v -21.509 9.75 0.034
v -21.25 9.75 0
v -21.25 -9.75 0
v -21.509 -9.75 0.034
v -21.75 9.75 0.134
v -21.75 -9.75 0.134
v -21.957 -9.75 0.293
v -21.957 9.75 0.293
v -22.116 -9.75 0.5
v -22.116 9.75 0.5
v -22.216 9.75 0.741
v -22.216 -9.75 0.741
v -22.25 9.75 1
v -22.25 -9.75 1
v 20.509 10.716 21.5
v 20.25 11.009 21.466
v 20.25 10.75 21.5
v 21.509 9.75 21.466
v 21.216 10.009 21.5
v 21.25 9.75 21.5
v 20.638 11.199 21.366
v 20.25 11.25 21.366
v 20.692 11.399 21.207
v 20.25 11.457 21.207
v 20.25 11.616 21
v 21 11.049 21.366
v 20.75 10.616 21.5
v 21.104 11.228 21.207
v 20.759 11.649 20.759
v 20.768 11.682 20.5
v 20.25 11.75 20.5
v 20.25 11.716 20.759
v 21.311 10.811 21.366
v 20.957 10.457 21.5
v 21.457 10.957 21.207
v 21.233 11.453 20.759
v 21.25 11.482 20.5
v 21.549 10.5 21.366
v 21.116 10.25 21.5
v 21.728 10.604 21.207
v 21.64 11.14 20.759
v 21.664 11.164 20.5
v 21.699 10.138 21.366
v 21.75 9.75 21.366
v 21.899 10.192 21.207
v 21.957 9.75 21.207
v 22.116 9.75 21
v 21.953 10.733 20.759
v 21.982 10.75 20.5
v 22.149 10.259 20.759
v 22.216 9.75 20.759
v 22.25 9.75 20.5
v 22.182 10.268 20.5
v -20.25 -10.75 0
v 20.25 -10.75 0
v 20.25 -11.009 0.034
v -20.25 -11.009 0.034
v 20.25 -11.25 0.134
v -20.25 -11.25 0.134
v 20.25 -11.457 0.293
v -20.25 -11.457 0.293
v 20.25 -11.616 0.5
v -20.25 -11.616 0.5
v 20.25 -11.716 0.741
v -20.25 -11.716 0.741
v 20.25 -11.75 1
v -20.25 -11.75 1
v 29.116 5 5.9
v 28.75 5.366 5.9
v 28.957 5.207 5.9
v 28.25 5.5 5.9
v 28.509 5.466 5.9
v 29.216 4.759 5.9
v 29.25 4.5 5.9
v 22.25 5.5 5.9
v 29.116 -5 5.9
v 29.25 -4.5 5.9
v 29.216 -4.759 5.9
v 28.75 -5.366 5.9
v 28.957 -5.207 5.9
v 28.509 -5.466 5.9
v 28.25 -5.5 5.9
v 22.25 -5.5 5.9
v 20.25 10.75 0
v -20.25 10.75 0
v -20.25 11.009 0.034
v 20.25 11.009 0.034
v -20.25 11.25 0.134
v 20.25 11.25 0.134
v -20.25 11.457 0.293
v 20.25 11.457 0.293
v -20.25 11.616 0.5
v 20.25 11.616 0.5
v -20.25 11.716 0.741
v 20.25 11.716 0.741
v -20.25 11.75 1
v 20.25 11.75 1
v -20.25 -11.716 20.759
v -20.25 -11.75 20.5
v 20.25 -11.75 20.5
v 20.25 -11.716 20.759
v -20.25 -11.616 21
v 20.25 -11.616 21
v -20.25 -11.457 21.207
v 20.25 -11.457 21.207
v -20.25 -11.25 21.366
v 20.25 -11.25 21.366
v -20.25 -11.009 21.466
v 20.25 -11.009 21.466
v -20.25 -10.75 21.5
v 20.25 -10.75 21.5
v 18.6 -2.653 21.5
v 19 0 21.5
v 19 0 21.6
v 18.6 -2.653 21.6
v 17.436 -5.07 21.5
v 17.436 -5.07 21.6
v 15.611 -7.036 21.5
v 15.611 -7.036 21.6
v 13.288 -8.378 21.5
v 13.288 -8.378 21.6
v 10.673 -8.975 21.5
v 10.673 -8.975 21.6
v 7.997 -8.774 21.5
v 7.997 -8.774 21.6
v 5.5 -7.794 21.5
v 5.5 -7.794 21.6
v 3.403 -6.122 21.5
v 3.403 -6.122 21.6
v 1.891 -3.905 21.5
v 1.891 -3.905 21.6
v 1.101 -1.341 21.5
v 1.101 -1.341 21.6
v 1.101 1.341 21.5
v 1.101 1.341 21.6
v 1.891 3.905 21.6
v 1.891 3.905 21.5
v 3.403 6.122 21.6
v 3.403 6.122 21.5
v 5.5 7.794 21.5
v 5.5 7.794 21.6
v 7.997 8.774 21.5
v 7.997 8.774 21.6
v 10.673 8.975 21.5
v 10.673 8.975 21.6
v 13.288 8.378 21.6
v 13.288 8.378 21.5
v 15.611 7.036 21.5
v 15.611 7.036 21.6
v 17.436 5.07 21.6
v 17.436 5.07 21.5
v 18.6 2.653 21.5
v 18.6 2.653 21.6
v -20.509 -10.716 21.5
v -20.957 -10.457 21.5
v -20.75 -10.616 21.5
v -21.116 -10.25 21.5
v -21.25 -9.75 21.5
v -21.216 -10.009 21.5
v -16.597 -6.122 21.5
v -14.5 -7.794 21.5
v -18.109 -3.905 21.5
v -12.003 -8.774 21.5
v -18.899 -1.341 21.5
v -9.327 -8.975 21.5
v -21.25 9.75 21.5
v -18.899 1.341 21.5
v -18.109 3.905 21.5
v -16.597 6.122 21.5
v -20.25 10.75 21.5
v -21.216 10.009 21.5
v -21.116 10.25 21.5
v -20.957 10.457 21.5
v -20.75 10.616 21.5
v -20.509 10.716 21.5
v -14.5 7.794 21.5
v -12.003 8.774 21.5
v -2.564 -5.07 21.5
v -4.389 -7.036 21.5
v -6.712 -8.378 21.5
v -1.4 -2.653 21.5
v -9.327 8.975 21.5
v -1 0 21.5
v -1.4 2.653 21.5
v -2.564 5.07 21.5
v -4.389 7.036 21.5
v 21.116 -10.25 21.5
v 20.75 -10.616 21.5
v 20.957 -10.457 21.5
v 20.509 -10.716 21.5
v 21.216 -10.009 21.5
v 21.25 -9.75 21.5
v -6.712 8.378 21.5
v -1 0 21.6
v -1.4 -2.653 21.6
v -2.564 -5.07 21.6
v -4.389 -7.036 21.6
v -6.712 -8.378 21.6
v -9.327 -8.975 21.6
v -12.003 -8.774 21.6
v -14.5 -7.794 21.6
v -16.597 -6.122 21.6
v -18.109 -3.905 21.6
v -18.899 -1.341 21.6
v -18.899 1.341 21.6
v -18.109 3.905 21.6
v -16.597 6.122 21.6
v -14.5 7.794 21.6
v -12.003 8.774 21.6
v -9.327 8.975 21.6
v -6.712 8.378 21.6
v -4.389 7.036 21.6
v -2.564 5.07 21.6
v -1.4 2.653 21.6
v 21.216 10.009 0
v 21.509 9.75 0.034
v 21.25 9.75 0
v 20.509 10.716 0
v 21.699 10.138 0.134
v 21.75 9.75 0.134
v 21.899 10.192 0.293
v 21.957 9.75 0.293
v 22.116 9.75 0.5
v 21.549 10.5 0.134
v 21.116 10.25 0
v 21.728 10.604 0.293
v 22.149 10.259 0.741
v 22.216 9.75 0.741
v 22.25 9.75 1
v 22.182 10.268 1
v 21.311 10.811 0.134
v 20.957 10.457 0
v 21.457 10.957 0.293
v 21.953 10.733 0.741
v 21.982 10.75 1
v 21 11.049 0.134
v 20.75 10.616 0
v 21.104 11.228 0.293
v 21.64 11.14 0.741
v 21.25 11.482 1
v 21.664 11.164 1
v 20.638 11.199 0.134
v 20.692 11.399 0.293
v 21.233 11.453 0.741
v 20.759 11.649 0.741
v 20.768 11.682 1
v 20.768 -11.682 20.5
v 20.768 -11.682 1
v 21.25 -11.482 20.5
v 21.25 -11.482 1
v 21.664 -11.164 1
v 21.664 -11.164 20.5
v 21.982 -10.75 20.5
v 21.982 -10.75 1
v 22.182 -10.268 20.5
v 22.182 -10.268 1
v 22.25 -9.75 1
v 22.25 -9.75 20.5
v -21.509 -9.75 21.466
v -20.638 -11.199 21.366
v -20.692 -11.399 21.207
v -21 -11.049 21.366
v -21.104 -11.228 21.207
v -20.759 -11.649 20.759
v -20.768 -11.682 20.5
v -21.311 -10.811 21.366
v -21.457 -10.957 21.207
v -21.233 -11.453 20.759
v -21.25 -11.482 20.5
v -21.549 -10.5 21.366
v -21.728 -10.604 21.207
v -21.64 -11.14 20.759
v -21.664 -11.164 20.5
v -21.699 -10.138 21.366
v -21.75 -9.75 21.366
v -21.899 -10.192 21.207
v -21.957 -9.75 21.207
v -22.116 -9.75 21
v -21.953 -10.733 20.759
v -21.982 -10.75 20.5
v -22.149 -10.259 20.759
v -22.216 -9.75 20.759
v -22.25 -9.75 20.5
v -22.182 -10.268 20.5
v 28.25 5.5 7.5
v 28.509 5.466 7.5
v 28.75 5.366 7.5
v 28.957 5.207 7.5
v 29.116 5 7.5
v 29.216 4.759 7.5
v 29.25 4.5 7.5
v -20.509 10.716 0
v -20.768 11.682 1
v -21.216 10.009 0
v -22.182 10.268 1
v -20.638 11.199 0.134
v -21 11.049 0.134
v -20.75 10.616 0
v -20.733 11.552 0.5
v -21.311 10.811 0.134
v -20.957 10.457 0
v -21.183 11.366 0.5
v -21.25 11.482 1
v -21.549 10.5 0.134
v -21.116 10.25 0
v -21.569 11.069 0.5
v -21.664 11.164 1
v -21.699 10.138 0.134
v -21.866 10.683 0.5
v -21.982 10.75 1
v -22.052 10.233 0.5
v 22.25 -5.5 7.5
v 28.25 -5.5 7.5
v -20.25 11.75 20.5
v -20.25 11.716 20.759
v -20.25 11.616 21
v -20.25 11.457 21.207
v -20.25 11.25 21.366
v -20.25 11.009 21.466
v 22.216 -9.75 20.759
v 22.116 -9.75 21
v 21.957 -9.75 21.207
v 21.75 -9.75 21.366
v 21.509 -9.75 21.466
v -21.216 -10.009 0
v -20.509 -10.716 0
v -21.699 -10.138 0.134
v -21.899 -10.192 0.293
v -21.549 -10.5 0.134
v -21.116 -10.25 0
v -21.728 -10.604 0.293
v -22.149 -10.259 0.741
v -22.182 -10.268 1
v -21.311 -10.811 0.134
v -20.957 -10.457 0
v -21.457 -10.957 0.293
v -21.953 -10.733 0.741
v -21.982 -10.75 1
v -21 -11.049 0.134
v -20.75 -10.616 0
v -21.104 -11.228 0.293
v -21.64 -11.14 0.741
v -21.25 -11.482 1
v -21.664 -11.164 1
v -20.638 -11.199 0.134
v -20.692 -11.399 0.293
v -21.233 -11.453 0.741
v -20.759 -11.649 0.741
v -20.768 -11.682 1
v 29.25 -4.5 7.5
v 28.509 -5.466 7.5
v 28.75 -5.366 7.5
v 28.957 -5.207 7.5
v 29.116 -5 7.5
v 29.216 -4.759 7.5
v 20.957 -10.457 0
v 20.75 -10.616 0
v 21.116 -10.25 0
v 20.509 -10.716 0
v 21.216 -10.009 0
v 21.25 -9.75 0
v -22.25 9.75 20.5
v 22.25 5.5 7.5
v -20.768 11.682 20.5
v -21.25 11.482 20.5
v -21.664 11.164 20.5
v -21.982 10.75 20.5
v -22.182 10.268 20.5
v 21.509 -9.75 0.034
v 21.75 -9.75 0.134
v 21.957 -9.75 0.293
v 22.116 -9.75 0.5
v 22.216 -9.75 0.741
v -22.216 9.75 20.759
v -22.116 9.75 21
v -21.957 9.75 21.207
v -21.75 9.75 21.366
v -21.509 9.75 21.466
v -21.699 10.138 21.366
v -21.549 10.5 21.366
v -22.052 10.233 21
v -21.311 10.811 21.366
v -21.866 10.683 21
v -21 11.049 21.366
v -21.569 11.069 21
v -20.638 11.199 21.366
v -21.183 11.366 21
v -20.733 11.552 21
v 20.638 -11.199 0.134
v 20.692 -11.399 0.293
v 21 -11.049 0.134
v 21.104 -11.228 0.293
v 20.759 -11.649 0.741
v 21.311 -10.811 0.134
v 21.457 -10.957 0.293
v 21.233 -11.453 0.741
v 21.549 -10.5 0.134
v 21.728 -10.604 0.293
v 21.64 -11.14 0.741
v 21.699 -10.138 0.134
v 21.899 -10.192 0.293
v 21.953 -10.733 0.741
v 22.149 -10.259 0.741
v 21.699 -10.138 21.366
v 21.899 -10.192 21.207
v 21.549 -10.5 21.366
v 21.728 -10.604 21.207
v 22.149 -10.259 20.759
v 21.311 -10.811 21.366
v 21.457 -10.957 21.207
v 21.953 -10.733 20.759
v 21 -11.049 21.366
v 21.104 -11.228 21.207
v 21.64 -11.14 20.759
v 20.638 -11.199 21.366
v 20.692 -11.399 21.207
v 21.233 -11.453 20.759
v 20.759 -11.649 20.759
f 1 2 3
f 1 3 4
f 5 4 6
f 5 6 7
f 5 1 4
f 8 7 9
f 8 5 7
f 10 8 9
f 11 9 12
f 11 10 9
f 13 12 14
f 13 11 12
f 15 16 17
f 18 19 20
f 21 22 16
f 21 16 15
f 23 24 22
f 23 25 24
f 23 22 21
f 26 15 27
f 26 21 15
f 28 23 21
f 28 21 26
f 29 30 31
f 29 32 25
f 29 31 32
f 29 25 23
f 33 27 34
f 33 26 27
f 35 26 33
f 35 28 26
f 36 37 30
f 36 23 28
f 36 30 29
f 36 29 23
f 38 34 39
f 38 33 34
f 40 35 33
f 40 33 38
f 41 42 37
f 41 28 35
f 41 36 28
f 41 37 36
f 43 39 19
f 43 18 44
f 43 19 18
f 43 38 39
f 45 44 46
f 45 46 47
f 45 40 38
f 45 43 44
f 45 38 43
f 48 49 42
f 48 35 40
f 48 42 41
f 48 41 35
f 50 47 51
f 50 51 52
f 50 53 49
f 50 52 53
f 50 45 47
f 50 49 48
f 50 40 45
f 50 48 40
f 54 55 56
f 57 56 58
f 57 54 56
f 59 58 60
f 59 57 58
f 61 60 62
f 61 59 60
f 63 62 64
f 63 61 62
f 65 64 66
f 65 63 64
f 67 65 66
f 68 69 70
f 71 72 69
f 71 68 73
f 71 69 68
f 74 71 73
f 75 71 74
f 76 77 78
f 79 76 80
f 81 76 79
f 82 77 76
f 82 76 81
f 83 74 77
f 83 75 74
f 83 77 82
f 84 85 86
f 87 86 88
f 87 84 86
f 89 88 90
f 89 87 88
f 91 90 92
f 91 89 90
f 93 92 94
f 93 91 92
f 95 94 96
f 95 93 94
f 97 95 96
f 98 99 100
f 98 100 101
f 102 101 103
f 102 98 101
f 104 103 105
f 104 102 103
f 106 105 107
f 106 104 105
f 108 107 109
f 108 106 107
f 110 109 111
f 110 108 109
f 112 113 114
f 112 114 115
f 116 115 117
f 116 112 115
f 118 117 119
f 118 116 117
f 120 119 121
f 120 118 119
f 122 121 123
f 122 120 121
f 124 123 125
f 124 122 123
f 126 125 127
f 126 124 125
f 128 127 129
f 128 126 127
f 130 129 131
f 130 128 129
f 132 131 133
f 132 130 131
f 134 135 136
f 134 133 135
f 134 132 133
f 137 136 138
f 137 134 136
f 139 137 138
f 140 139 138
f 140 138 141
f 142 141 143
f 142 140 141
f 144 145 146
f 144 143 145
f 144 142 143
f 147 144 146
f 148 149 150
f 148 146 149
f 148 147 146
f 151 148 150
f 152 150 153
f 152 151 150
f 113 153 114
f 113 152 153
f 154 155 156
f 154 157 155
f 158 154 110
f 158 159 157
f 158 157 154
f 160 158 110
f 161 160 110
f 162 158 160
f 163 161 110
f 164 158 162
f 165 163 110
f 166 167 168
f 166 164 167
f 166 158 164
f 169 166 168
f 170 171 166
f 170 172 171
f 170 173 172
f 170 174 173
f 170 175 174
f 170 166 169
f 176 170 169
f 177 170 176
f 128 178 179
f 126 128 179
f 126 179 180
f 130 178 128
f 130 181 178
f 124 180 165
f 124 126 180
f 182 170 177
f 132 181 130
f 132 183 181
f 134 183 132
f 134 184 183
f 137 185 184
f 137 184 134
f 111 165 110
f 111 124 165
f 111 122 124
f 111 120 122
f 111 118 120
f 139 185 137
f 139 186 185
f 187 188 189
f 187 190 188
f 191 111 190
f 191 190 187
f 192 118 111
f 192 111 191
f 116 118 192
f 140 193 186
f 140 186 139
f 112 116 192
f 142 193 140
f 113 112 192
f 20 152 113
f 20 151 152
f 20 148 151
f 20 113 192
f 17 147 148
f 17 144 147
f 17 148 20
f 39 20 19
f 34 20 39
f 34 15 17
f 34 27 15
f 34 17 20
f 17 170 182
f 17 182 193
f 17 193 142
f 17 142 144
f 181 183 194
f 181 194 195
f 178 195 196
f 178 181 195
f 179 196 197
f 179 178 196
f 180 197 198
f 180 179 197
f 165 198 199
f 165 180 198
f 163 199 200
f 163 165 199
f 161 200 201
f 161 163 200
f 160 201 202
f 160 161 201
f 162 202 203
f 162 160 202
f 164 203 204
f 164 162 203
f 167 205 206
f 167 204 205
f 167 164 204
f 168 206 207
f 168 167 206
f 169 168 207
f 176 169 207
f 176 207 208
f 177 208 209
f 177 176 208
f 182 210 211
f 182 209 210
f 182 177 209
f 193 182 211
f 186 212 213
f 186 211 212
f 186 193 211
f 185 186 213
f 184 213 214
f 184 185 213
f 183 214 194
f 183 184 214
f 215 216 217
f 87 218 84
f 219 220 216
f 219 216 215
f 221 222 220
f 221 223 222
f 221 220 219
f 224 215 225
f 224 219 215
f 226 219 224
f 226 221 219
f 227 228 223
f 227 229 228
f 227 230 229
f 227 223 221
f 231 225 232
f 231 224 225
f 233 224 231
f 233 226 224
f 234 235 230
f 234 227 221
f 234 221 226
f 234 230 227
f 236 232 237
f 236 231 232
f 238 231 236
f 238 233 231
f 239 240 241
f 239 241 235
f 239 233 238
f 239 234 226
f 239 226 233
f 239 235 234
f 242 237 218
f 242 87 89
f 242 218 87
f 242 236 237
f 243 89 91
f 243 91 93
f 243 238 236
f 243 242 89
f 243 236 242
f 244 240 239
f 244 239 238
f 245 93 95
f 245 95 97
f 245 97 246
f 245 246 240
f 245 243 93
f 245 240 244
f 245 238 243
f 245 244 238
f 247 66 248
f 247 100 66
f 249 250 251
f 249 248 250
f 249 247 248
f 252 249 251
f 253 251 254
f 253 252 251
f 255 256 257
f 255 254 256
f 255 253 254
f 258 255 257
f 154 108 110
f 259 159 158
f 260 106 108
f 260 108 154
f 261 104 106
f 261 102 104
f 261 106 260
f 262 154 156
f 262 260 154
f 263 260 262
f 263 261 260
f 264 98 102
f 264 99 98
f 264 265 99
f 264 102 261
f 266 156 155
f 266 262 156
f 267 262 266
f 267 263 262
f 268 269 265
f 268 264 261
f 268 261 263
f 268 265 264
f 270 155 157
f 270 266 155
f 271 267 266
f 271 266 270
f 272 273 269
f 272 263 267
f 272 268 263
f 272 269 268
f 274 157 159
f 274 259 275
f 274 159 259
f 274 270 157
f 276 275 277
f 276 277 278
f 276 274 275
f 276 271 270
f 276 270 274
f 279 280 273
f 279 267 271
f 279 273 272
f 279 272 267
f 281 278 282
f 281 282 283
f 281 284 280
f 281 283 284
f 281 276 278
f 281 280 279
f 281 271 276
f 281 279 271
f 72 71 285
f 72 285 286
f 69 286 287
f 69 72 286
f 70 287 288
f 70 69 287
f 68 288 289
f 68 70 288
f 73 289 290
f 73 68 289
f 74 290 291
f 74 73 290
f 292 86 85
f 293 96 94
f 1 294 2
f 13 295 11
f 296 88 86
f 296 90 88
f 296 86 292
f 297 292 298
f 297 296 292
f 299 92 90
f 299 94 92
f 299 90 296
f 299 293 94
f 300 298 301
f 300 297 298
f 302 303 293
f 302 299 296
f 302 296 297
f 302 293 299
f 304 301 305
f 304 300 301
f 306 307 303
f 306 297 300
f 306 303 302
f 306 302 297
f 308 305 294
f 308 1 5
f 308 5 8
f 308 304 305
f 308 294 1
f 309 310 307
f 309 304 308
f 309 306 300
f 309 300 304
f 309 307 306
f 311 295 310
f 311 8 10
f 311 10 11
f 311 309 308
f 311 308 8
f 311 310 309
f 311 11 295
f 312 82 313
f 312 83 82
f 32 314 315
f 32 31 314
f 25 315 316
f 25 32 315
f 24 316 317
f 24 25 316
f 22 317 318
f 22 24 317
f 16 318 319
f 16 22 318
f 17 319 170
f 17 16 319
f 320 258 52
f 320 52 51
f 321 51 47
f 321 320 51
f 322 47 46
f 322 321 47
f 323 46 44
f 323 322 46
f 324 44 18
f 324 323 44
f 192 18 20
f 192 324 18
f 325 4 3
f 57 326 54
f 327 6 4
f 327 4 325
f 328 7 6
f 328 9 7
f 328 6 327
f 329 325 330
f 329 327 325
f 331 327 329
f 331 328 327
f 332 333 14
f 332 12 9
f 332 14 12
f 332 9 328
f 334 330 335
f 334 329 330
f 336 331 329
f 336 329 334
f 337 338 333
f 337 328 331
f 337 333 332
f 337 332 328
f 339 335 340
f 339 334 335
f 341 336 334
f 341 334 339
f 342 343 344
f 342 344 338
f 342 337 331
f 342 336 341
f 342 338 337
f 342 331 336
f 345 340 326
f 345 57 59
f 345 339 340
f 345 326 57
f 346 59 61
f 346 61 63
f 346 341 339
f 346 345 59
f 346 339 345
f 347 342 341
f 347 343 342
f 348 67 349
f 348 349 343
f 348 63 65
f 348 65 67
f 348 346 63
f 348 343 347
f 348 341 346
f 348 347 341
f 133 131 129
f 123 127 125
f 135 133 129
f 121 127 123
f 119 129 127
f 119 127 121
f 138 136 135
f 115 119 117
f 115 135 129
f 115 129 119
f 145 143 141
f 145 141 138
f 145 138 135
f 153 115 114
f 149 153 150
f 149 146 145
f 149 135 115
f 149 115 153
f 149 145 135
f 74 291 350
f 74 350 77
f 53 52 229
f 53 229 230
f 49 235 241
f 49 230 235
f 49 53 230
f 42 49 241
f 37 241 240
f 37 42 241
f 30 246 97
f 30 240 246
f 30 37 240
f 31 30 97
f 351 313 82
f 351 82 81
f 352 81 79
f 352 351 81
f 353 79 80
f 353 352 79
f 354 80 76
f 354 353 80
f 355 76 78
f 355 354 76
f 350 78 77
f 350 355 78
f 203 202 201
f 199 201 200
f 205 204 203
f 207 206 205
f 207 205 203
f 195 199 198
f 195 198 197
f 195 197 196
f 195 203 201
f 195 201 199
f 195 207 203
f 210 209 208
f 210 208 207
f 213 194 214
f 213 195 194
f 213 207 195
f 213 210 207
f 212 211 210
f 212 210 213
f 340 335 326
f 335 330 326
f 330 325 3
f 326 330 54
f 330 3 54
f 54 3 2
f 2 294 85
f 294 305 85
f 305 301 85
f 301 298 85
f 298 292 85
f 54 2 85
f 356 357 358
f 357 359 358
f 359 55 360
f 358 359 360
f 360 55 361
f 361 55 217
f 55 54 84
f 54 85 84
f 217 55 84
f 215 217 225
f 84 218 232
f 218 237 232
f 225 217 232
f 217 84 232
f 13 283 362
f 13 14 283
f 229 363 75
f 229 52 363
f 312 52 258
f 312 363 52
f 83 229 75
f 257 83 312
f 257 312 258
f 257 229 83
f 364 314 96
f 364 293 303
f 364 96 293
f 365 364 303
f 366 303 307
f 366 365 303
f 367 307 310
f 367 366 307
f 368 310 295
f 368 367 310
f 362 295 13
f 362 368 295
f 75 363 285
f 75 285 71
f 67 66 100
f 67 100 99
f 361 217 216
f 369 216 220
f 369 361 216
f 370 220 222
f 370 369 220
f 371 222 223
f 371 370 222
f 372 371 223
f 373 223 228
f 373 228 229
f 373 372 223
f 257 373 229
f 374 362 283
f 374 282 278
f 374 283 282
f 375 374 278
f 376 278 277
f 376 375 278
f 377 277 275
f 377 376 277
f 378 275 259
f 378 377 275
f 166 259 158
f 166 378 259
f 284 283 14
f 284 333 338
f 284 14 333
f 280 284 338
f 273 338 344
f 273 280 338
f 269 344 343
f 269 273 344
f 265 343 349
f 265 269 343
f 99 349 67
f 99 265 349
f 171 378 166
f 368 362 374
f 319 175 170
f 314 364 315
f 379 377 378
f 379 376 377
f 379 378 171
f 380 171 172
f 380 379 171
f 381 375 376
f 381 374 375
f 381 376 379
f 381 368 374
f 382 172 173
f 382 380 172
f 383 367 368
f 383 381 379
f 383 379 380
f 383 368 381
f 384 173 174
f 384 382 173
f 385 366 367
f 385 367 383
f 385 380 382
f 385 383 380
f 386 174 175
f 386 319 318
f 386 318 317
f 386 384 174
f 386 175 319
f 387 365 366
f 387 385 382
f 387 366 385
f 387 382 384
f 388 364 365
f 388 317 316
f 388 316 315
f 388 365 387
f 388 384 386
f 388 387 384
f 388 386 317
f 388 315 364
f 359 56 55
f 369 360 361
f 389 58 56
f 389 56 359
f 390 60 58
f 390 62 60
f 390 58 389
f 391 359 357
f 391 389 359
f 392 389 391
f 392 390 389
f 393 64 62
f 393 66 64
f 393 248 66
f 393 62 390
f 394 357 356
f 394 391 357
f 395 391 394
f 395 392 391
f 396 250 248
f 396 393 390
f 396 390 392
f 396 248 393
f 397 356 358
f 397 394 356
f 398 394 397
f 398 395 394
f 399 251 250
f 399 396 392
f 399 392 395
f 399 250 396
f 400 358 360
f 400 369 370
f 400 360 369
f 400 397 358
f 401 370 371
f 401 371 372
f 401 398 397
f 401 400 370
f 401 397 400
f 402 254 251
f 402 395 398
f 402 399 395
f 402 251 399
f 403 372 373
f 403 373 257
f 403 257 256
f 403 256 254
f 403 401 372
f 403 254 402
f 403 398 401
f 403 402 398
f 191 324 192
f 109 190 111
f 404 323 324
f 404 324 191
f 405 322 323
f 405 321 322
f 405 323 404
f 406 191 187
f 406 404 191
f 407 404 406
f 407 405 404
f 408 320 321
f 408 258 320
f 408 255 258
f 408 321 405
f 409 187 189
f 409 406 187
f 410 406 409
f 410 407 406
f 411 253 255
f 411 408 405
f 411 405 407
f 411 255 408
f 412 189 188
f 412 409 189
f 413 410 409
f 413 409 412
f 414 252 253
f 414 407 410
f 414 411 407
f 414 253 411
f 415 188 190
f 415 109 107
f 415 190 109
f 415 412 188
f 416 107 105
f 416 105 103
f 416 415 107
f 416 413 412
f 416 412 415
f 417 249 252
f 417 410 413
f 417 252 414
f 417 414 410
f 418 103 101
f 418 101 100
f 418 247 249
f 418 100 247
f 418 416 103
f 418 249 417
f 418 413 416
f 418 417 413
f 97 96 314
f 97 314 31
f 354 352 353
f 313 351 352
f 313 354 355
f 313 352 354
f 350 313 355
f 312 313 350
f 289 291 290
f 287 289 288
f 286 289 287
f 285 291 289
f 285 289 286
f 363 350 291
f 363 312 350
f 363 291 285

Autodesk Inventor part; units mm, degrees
ref_plane "YZ Plane" through (0, 0, 0) normal (1, 0, 0) x (0, 1, 0)
ref_plane "XZ Plane" through (0, 0, 0) normal (0, 1, 0) x (-1, 0, 0)
ref_plane "XY Plane" through (0, 0, 0) normal (0, 0, 1) x (1, 0, 0)
sketch "Sketch2" plane through (0, 0, 0) normal (0, 0, 1) x (1, 0, 0)
  line L0 (22.25, -11.75) -> (-22.25, -11.75)
  line L1 (-22.25, -11.75) -> (-22.25, 11.75)
  line L2 (-22.25, 11.75) -> (22.25, 11.75)
  line L3 (22.25, 11.75) -> (22.25, -11.75)
  line L4 (22.25, -11.75) -> (-22.25, 11.75) construction
  line L5 (-22.25, -11.75) -> (22.25, 11.75) construction
  point P0 (0, 0)
  dimension "d0" = 44.5
  dimension "d1" = 23.5
extrude "Extrusion1" add sketch "Sketch2" along normal blind 21.5
sketch "Sketch3" plane through (22.25, -11.75, 0) normal (1, 0, 0) x (0, 0, -1)
  line L0 (-7.5, 17.25) -> (-5.9, 17.25)
  line L1 (-5.9, 17.25) -> (-5.9, 6.25)
  line L2 (-5.9, 6.25) -> (-7.5, 6.25)
  line L3 (-7.5, 6.25) -> (-7.5, 17.25)
  line L4 (-21.5, 0) -> (-21.5, 23.5) construction
  line L5 (0, 23.5) -> (-21.5, 23.5) construction
  point P0 (0, 11.75)
  dimension "d4" = 11
  dimension "d5" = 1.6
  dimension "d6" = 14
  dimension "d7" = 6.25
  dimension "d8" = 23.5
extrude "Extrusion2" add sketch "Sketch3" along normal blind 7
sketch "Sketch4" plane through (0, 0, 21.5) normal (0, 0, 1) x (1, 0, 0)
  line L0 (22.25, 11.75) -> (-22.25, 11.75) construction
  line L1 (-22.25, 11.75) -> (-22.25, -11.75) construction
  line L2 (-22.25, -11.75) -> (22.25, -11.75) construction
  line L3 (22.25, -11.75) -> (22.25, 11.75) construction
  circle A0 centre (-10, 0) radius 9
  circle A1 centre (10, 0) radius 9
  line L4 (0, 16.45) -> (0, -16.45) construction
  line L5 (-33.55, 0) -> (45.55, 0) construction
  point P0 (0, 0)
  dimension "d11" = 18
  dimension "d12" = 10
  dimension "d13" = 18
  dimension "d14" = 10
extrude "Extrusion3" add sketch "Sketch4" along normal blind 0.1
fillet "Fillet1" radius 2 4 edges at (-22.25, 11.75, 10.75) (22.25, 11.75, 10.75) (22.25, -11.75, 10.75) (-22.25, -11.75, 10.75)
fillet "Fillet2" radius 1 18 edges at (-21.6642, 11.1642, 21.5) (-22.25, 0, 21.5) (-21.6642, -11.1642, 21.5) (0, -11.75, 21.5) (21.6642, -11.1642, 21.5) (22.25, 0, 21.5) (21.6642, 11.1642, 21.5) (0, 11.75, 21.5) (-21.6642, 11.1642, 0) (-22.25, 0, 0) (-21.6642, -11.1642, 0) (0, -11.75, 0) (21.6642, -11.1642, 0) (22.25, 0, 0) (21.6642, 11.1642, 0) (0, 11.75, 0) (29.25, 5.5, 6.7) (29.25, -5.5, 6.7)
sketch "Sketch5" plane through (-20.25, 11.75, 1) normal (0, 1, 0) x (1, 0, 0)
  point P0 (20.25, 1)
equation "\"d7\" = -0.5 * d4 + 0.5 * d8"
properties part number "P041_Lidar"
